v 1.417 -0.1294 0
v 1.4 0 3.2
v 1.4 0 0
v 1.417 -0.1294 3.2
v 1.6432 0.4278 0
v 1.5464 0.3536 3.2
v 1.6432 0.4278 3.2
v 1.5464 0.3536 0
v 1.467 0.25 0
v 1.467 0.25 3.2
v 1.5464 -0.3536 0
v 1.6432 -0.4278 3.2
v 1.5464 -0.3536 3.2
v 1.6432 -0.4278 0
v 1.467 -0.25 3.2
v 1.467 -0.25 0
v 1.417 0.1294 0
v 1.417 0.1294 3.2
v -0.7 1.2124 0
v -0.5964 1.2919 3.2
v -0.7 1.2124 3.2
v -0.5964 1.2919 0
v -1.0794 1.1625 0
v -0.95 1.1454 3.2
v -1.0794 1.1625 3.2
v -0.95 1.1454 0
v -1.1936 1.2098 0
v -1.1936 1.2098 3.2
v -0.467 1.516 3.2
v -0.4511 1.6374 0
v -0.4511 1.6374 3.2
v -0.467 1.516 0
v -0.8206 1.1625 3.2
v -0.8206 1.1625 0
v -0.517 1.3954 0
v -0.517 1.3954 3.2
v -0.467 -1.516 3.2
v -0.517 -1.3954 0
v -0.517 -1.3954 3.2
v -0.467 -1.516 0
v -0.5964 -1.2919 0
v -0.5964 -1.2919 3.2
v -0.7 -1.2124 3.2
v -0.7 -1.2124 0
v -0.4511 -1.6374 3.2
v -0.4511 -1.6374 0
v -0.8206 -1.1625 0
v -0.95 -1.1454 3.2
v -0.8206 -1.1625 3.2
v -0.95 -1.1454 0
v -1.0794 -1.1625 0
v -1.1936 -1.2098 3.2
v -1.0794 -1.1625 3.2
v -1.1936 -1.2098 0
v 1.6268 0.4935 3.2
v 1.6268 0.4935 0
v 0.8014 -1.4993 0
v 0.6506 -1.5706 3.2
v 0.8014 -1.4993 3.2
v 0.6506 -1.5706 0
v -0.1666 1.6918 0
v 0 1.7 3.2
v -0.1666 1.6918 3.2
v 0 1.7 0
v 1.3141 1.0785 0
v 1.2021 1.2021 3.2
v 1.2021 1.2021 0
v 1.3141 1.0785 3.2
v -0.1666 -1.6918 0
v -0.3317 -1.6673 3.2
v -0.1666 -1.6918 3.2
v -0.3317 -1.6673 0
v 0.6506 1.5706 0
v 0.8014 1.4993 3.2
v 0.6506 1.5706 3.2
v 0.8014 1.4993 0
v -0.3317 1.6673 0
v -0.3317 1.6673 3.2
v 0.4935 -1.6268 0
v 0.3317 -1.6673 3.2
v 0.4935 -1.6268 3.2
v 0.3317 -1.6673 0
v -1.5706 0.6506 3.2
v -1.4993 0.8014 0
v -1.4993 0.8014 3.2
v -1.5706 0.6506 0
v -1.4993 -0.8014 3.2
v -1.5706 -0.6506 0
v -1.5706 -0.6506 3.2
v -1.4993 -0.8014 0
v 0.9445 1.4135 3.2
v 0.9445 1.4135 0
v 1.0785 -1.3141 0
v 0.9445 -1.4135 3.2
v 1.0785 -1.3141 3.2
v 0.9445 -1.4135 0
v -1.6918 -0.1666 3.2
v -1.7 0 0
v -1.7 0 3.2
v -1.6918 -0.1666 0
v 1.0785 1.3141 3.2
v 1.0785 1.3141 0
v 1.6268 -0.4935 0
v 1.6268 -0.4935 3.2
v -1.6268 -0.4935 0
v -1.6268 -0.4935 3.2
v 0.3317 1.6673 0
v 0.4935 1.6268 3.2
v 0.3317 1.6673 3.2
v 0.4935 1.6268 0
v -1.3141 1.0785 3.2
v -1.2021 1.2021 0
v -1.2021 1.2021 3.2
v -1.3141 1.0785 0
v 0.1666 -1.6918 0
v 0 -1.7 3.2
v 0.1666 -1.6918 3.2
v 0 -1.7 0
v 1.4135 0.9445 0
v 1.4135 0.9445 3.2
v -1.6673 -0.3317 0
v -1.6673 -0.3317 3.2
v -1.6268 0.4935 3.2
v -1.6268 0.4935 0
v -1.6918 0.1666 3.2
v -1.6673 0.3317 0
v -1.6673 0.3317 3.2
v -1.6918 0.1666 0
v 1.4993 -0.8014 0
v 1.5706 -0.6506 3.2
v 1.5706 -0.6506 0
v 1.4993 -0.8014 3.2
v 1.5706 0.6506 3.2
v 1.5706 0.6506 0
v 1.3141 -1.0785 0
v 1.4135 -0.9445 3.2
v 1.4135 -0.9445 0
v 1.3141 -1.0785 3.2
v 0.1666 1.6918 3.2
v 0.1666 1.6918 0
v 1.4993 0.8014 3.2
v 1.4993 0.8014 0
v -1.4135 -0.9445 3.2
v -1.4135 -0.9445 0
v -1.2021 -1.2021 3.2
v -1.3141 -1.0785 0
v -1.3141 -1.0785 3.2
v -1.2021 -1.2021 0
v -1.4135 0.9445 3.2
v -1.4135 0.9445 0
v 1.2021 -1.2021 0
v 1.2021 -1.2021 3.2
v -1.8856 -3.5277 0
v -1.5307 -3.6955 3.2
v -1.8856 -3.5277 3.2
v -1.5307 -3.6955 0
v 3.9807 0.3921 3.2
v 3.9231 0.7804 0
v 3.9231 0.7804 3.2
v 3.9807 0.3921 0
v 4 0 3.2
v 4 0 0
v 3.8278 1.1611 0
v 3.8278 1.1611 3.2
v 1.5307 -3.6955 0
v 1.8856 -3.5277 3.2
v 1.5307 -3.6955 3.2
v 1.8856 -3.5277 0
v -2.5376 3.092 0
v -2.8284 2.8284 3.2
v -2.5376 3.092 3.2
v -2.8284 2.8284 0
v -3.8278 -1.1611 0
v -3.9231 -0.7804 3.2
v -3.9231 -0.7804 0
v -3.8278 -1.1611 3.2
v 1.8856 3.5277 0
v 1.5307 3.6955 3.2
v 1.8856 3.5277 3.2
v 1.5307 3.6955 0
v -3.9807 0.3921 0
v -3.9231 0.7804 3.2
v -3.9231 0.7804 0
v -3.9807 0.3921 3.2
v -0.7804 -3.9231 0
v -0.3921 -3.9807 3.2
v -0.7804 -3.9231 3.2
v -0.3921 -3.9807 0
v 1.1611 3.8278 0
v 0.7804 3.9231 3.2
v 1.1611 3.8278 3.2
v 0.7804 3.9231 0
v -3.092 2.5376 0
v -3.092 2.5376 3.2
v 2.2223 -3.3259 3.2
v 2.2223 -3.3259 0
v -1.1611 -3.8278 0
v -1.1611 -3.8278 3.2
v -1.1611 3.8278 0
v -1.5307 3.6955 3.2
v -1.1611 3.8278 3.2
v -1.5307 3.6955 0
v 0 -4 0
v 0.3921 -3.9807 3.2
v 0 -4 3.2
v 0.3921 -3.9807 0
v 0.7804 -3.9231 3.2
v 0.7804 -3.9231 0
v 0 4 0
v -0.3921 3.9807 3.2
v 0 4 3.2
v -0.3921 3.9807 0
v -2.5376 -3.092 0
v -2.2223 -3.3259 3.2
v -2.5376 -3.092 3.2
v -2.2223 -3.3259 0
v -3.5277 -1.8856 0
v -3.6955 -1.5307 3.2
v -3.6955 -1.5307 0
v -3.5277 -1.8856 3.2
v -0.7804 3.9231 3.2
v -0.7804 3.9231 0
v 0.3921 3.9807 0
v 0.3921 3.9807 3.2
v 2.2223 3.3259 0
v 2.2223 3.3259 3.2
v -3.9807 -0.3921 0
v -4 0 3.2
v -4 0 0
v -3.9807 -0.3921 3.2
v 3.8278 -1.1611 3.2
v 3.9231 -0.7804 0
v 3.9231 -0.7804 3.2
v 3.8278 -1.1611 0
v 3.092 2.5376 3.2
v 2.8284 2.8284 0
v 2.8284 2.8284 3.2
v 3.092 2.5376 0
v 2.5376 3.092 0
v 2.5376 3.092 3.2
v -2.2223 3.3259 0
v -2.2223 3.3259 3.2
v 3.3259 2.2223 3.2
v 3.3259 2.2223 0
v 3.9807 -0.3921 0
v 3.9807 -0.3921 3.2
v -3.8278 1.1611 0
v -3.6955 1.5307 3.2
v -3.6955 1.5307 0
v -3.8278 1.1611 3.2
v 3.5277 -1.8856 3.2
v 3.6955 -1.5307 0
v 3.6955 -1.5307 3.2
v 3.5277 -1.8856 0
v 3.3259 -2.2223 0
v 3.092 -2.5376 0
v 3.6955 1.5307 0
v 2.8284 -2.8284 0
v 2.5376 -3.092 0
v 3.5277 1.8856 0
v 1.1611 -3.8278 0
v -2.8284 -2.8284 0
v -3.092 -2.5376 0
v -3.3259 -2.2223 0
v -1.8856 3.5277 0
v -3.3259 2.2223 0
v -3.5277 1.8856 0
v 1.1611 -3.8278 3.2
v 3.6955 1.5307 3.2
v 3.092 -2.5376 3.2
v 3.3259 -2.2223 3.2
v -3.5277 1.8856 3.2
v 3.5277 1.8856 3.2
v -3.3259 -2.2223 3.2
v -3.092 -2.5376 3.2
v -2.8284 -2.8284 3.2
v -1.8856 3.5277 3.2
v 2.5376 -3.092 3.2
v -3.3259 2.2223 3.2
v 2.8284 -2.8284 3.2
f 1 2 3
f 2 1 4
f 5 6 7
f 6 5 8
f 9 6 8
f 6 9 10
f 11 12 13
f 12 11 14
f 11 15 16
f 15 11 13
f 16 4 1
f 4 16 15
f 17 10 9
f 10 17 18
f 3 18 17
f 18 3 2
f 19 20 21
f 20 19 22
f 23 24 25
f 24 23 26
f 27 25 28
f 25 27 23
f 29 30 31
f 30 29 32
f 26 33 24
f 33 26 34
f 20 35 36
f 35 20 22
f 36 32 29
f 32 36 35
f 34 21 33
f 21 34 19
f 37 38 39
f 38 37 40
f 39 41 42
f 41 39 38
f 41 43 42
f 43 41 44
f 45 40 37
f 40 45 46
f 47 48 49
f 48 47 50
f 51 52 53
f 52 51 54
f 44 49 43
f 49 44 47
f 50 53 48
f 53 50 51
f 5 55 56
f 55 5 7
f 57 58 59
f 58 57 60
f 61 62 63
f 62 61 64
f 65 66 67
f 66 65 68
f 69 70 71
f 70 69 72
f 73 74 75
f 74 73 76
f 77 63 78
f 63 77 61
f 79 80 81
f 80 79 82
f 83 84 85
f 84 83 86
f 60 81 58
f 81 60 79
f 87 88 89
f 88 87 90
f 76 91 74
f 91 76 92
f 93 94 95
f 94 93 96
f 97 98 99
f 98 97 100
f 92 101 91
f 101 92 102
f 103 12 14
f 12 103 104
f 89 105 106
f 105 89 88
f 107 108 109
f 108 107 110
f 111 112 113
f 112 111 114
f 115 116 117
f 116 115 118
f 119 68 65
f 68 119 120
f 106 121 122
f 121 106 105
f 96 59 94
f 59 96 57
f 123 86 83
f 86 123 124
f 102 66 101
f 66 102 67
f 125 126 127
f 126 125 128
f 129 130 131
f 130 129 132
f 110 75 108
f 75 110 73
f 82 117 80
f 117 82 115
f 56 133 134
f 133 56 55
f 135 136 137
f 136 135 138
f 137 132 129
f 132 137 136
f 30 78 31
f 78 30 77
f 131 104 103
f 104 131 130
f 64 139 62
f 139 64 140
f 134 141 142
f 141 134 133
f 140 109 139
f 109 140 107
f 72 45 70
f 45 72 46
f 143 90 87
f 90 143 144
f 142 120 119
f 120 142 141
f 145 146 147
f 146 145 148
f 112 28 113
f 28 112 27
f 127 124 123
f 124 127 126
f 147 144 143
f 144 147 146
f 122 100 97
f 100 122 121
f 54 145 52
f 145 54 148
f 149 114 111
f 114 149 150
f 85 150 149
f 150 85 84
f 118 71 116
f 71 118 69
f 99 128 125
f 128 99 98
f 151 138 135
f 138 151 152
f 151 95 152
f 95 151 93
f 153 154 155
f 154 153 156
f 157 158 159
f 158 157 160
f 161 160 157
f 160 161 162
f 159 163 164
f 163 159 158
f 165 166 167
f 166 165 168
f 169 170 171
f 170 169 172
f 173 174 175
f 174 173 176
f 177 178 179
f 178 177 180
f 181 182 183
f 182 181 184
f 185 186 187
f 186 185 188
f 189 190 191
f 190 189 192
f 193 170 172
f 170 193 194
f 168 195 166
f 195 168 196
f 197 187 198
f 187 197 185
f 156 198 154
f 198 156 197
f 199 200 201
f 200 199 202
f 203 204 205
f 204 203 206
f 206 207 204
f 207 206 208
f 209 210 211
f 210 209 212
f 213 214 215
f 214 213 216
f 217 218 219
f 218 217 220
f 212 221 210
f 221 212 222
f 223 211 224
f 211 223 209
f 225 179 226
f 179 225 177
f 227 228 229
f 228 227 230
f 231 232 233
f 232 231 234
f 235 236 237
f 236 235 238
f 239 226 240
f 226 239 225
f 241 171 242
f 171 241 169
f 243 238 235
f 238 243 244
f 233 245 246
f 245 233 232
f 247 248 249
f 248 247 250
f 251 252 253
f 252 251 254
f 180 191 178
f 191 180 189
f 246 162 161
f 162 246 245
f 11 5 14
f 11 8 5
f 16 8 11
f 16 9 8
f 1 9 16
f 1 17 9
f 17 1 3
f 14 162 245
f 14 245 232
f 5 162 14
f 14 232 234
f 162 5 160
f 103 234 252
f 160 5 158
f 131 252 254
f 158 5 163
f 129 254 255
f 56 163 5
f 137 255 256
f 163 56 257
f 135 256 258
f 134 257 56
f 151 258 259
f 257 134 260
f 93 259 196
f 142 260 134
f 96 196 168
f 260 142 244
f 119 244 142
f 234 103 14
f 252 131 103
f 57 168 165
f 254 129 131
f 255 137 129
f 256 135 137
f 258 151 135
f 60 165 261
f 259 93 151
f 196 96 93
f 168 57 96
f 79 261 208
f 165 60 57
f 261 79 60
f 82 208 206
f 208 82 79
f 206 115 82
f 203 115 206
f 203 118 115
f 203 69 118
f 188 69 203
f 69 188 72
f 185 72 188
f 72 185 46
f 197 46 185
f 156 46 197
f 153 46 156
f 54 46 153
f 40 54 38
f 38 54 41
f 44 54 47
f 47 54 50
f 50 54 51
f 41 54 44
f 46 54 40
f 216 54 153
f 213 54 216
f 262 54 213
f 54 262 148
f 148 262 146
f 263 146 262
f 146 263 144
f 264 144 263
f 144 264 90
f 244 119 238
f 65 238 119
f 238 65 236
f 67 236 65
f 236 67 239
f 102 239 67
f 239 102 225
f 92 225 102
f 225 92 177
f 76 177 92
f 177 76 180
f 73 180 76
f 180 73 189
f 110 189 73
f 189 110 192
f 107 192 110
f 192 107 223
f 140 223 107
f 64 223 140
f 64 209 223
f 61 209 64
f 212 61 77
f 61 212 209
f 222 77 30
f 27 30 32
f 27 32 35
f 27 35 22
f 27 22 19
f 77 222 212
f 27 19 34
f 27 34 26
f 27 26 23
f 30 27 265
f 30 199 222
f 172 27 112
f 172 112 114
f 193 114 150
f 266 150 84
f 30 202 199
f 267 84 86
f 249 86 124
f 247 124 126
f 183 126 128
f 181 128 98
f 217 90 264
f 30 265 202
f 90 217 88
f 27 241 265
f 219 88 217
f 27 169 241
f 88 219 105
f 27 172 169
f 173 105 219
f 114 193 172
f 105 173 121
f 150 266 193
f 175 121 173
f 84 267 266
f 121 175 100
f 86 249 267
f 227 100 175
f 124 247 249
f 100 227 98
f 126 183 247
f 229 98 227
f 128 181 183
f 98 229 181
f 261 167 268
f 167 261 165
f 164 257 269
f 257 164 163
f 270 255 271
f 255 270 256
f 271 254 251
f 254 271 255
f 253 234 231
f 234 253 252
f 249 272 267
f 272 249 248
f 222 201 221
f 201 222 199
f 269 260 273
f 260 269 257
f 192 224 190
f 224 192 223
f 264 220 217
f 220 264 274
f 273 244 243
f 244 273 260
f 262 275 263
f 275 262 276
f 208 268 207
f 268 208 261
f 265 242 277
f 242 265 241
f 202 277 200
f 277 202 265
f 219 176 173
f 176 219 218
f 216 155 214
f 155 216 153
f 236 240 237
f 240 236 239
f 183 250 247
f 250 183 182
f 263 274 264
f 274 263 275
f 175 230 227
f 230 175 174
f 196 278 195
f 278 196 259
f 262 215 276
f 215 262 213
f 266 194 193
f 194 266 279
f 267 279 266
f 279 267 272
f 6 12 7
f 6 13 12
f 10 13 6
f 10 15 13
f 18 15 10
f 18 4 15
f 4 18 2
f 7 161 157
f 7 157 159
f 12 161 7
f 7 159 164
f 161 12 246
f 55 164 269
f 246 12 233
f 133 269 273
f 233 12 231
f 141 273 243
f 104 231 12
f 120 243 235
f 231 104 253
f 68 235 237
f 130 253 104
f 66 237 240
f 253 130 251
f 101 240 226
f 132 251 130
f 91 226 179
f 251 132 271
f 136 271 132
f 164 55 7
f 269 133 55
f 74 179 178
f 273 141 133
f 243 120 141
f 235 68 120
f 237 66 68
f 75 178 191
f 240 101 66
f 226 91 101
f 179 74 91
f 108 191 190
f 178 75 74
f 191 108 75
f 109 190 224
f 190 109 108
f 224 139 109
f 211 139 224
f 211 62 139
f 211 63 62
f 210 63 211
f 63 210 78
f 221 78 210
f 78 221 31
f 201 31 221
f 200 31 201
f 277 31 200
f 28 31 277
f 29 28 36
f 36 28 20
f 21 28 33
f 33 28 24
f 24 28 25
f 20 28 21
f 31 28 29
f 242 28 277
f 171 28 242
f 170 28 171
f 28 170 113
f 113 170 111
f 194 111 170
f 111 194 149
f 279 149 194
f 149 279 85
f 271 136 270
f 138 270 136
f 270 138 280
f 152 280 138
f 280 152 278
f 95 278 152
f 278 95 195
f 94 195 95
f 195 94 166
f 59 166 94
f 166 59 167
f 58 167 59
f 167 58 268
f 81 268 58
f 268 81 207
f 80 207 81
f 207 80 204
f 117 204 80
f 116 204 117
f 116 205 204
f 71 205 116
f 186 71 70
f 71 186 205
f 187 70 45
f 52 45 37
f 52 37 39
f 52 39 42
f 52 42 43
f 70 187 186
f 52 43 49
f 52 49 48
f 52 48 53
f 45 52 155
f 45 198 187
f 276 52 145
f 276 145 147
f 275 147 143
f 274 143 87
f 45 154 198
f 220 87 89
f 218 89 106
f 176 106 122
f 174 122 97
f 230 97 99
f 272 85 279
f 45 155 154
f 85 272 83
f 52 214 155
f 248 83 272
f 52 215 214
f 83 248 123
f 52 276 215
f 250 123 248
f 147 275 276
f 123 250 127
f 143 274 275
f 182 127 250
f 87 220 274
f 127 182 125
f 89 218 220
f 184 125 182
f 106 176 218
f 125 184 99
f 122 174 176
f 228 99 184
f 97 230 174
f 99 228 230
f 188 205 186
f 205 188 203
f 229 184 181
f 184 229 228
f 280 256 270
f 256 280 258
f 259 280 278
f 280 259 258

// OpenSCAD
// file: ../config.scad
// =====================================================================
//  Brick system: global configuration
//
//  Every grid and fit value from SPEC.md lives here. Values marked
//  [fit] are the ones to re-tune per printer/filament with the
//  calibration coupon (parts.scad -> coupon()). Override any of them
//  from the command line without editing this file:
//
//    openscad -D 'RIB_D=4.8' -o plate.stl examples/plates.scad
//
//  All lengths in mm. Designed for a 0.4 mm nozzle and 0.2 mm layers.
// =====================================================================

$fn = 64;
eps = 0.01;               // overlap for clean booleans (not a real dimension)
FONT = "DejaVu Sans:style=Bold";

// ---------- print process ----------
LINE   = 0.45;            // extrusion width; walls are multiples (see WALL_*)
LAYER  = 0.2;             // layer height; heights are multiples of this
WALL_1 = 0.9;             // 2 lines, the minimum anywhere
WALL_2 = 1.3;             // 3 lines
WALL_3 = 1.8;             // 4 lines
BRIDGE_MAX = 6.0;         // longest flat bridge allowed

// ---------- grid ----------
PITCH = 8.0;              // horizontal grid
PLATE = 3.2;              // plate height
BRICK = 9.6;              // 3 plates
GAP   = 0.1;              // per side; outer size = n*8 - 0.2

// ---------- connector 1: stud + crush-rib socket ----------
STUD_D        = 5.0;
STUD_H        = 1.6;
STUD_CHAMFER  = 0.4;      // lead-in on top of stud
STUD_FILLET   = 0.4;      // root fillet against layer-line breakage
SOCKET_D      = 5.4;      // bore: 0.2 mm clearance per side before ribs
SOCKET_DEPTH  = 1.8;      // leaves a 1.4 mm roof in a 3.2 mm plate
SOCKET_CHAMF  = 0.4;      // entry chamfer (also hides elephant's foot)
RIB_R         = 0.5;      // rib = vertical half-cylinder
RIB_N         = 4;
RIB_D         = 4.75;     // [fit] diameter across rib tips (4.8 / 4.7 tested good)
ROOF          = PLATE - SOCKET_DEPTH;   // 1.4 mm of material above a socket in a plate

// ---------- connector 2: slot + flat clip ----------
CLIP_T      = 2.0;        // thickness (Z when printed flat)
CLIP_W      = 5.0;        // body width
CLIP_HALF   = 3.4;        // engagement depth per side (clip length 6.8)
CLIP_ARM    = 0.9;        // spring arm width (2 lines)
CLIP_BAND   = 0.8;        // solid centre band
BARB        = 0.3;        // barb height above body width, per side
BARB_LEAD   = 0.15;       // chamfer at arm tip
CLIP_ROOT_R = 0.3;        // fillet radius at the arm roots
SLOT_CLEAR  = 0.15;       // [fit] clearance per side in the thickness direction
SLOT_INTERF = 0.10;       // [fit] barb interference per side
SLOT_T      = CLIP_T + 2*SLOT_CLEAR;   // 2.3
SLOT_DEPTH  = CLIP_HALF + 0.2;         // 3.6
SLOT_CHAMF  = 0.4;        // entry chamfer of top-face slots
SIDE_SLOT_MIN_H = 2*PLATE;             // parts lower than 6.4 get no side slots
function slot_len(interf = SLOT_INTERF) = CLIP_W + 2*(BARB - interf);   // 5.4

// ---------- axles ----------
AXLE_D       = 3.0;       // steel rod / M3 screw
BORE_SPIN_D  = 3.2;       // [fit] free-running teardrop bore (3.3 too wobbly)
BORE_GRIP_D  = 2.8;       // [fit] diameter across rib tips of a grip bore
GRIP_BORE_D  = 3.4;       // base bore under the grip ribs
AXLE_FLAT    = 0.3;       // flat on the bed side of a printed axle

// ---------- part design values (not connector fits) ----------
HINGE_CLEAR    = 0.3;     // gap between interleaved hinge knuckles, radial and axial
WHEEL_CHANNEL  = 1.2;     // depth of the tyre channel in a wheel rim
TIRE_STRETCH   = 0.2;     // tyre inner radius is this much smaller than the channel (TPU)

// ---------- helpers ----------
function cell(i) = PITCH*i + PITCH/2;          // centre of grid cell i
function snap_layer(h) = round(h / LAYER) * LAYER;
// main file
// Grip collar: clamps onto the axle outside a wheel.
include <../parts.scad>

/* [Collar] */
// Outer diameter (mm)
d = 8; // [6:0.2:16]
// Height (mm)
h = 3.2; // [1.6:0.2:10]

grip_collar(d = d, h = h);
